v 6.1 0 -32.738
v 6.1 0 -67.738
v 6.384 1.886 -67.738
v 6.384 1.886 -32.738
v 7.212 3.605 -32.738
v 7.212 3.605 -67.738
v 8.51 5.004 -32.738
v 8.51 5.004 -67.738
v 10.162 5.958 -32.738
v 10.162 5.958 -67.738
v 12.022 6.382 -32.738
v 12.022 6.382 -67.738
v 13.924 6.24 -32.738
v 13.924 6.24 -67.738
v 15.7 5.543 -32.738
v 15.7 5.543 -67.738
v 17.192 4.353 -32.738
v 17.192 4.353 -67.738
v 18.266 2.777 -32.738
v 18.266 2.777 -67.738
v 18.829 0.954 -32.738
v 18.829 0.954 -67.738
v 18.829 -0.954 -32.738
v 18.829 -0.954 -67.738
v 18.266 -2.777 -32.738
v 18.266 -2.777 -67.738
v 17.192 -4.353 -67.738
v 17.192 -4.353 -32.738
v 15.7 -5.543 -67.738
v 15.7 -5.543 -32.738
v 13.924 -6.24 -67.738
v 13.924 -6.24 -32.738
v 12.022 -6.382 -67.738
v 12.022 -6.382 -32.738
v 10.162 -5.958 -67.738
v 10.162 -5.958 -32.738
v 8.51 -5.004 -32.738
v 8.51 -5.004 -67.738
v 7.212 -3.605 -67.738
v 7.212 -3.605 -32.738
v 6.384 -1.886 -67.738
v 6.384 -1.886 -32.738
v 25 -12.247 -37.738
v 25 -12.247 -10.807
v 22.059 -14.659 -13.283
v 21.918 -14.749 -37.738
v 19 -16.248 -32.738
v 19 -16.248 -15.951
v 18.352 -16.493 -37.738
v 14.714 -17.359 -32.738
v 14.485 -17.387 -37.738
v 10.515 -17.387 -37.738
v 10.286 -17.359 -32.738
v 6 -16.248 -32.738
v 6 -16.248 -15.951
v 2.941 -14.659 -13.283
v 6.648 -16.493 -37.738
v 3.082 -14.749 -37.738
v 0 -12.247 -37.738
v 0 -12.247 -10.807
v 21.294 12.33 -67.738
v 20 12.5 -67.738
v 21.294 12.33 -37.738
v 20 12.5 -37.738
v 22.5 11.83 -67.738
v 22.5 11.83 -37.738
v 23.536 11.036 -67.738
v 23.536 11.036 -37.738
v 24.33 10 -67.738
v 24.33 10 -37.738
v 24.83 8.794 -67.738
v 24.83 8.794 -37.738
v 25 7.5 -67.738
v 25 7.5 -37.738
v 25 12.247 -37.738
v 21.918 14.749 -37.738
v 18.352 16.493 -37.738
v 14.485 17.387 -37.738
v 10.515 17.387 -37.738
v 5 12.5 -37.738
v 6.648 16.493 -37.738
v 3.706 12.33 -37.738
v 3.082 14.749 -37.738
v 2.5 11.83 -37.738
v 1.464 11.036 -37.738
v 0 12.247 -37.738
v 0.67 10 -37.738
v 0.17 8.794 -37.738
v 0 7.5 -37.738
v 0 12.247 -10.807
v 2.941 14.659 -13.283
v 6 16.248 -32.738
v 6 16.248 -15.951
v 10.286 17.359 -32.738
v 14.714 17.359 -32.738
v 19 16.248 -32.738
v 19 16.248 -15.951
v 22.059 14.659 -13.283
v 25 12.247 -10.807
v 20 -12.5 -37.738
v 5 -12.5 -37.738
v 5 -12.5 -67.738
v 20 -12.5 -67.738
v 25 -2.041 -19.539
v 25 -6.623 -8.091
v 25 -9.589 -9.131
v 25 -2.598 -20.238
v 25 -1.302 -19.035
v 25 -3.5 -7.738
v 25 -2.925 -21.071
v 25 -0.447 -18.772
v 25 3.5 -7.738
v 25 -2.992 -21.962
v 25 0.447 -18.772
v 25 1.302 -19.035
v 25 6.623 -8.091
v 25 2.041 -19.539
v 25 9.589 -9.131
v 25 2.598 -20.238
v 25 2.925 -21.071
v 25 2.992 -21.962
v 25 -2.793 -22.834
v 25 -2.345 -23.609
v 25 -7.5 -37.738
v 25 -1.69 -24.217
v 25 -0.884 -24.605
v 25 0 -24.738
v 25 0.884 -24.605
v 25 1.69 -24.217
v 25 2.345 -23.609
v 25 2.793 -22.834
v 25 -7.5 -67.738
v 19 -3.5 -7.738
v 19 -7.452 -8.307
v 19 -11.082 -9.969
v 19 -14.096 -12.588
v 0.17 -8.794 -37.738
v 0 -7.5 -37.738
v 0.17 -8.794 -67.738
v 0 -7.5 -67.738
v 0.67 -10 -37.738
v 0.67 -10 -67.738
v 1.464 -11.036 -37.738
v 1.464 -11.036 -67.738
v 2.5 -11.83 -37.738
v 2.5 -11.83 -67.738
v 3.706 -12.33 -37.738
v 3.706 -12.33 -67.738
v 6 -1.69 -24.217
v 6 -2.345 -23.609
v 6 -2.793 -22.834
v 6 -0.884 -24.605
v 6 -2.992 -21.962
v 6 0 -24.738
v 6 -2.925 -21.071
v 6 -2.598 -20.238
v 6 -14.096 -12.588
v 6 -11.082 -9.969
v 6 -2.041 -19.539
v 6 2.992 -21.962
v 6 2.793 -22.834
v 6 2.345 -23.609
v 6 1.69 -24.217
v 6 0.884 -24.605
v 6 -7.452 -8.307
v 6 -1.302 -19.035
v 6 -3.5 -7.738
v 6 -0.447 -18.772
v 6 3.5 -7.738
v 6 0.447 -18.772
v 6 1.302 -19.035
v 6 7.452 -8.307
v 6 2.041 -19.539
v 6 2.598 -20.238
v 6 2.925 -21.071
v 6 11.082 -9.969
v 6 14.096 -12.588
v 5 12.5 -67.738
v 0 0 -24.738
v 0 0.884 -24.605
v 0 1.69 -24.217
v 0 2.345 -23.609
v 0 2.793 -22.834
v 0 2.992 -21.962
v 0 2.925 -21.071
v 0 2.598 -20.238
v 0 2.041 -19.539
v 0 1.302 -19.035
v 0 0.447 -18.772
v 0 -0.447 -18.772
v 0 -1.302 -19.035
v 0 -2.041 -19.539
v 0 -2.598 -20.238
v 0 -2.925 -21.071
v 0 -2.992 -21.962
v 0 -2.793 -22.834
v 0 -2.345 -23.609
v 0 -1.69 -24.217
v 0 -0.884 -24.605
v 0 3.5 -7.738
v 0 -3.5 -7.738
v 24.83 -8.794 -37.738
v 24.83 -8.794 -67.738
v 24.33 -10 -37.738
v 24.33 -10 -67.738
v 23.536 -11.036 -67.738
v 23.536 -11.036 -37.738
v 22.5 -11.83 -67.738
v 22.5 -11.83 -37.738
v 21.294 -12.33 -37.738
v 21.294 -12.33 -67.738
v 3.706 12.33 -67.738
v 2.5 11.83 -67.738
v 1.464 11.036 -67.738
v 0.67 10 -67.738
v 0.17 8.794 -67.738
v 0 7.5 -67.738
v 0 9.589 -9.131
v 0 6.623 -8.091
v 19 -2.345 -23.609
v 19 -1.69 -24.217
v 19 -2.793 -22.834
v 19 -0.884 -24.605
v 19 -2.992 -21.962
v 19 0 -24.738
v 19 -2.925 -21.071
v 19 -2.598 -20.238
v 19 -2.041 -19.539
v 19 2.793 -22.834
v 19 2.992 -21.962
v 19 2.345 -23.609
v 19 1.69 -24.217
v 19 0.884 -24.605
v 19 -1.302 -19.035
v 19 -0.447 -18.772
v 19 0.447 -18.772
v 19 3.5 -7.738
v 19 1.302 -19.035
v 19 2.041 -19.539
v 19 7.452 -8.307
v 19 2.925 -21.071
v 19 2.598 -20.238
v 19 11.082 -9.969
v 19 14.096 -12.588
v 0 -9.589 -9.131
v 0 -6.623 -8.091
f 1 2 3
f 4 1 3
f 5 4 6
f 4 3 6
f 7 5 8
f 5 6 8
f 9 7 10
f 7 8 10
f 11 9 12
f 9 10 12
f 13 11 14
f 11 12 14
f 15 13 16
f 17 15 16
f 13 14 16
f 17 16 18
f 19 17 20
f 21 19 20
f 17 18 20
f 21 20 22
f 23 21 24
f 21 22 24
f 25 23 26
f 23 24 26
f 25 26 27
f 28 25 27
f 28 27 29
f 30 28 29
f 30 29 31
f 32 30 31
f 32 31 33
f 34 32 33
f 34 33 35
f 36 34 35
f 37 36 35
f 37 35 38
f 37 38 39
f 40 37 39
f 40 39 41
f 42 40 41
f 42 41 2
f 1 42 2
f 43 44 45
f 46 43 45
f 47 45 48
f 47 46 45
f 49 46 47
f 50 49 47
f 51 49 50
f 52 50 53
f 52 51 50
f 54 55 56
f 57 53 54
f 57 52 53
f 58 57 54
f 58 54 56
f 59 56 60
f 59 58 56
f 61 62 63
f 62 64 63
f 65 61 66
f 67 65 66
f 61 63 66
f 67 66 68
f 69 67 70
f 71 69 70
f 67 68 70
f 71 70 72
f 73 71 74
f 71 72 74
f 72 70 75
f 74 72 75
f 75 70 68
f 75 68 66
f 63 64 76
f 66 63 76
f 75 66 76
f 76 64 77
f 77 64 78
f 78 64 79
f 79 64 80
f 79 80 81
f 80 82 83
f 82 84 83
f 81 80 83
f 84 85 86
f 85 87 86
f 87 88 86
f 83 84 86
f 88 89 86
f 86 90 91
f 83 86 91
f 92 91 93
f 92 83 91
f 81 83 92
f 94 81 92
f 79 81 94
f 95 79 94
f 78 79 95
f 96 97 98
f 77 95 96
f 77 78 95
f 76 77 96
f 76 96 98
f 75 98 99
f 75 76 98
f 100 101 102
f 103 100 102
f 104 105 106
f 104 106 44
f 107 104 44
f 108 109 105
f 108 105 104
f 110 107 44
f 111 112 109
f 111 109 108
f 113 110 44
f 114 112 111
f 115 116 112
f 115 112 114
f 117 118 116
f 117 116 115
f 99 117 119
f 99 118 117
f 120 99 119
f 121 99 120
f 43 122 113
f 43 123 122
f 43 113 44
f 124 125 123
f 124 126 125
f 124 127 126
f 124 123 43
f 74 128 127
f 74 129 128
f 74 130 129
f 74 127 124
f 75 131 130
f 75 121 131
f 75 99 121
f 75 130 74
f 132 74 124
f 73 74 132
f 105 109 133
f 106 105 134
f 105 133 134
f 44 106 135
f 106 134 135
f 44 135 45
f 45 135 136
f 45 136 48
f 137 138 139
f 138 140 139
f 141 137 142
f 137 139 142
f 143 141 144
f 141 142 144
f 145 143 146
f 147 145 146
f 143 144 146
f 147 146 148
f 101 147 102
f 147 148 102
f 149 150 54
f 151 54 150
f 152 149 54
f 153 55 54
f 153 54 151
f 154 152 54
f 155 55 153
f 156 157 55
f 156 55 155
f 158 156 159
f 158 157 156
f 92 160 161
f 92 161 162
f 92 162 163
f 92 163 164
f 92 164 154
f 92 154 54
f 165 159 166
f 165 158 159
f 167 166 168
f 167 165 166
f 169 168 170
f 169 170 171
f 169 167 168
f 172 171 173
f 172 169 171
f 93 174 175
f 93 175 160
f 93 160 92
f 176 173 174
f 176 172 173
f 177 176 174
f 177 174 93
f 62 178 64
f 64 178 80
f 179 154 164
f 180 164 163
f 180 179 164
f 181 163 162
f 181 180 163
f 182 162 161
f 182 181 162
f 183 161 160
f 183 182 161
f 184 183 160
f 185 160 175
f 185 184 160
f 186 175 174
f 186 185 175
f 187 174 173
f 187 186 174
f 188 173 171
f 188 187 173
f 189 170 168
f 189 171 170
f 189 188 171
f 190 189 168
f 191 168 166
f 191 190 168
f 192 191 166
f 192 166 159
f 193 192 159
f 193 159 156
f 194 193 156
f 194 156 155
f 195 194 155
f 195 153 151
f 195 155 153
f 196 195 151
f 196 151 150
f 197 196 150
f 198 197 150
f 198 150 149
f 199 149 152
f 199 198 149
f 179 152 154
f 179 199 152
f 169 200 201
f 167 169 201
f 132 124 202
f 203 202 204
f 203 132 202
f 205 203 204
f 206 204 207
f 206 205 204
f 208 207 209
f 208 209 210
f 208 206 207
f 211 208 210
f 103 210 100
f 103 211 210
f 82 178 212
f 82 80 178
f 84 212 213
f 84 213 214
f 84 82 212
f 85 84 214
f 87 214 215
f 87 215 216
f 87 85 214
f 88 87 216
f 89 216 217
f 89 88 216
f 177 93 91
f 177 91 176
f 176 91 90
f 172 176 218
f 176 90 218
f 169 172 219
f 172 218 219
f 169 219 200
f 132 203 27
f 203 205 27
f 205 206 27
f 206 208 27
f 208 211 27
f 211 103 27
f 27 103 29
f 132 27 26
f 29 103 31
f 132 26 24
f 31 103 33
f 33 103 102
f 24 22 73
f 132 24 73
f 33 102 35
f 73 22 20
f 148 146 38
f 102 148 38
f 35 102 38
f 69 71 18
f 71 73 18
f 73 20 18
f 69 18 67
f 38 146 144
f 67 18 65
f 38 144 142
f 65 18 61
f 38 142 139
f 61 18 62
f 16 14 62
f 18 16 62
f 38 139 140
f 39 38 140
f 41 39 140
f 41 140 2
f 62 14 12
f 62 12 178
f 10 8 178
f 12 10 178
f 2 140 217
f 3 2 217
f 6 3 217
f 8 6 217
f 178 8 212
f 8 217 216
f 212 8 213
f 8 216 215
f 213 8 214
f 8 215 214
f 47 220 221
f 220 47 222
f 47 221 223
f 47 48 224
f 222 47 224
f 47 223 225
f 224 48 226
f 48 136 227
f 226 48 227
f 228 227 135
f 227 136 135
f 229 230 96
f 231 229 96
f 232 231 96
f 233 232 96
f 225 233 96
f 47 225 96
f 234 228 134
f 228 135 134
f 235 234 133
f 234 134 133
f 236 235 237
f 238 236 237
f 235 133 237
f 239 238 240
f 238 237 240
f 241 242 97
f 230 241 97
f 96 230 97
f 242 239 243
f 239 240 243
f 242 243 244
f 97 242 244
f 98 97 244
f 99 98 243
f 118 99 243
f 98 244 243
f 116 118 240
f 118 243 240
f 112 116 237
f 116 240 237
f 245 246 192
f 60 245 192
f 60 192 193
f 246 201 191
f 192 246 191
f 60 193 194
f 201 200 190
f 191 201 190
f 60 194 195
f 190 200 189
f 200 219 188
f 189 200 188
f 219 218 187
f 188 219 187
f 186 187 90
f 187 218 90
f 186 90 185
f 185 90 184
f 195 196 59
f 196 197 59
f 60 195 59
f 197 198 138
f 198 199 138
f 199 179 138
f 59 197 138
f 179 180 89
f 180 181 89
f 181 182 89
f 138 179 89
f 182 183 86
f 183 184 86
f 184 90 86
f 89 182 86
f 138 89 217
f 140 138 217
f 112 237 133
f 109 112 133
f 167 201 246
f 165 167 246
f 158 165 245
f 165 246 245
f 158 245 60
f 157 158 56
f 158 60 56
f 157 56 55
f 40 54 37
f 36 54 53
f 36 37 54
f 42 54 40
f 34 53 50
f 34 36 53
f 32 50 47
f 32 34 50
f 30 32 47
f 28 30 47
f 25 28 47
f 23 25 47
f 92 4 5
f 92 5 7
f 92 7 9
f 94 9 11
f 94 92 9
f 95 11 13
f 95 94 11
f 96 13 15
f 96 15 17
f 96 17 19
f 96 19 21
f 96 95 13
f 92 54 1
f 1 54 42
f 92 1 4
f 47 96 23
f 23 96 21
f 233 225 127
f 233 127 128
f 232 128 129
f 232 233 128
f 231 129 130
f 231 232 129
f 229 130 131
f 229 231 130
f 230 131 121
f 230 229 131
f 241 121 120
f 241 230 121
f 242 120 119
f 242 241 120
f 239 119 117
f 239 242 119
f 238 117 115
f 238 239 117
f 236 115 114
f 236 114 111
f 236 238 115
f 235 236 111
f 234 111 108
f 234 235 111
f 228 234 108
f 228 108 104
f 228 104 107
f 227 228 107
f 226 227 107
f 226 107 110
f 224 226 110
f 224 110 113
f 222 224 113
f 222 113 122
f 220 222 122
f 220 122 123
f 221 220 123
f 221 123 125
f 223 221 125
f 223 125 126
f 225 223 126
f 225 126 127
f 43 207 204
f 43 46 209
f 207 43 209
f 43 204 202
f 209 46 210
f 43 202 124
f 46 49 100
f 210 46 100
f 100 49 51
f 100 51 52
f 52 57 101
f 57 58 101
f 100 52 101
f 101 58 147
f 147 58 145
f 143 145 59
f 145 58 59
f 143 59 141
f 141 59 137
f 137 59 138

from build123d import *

# Parameters (mm, degrees)
SKETCH1_R           = 3
BOSS_EXTRUDE1_DEPTH = 25
SKETCH3_R           = 6.4
CUT_EXTRUDE2_DEPTH  = 108
SKETCH4_W           = 13
SKETCH4_H           = 40.487648952
CUT_EXTRUDE3_DEPTH  = 25
FILLET2_R           = 5
SKETCH5_OUTSIDE_W   = 41.764
SKETCH5_OUTSIDE_H   = 51.764
SKETCH5_OUTSIDE_R   = 17.5
CUT_EXTRUDE5_DEPTH  = 39


with BuildPart() as part:
    # Sketch1 → Boss-Extrude1 (new body)
    with BuildSketch(Plane(origin=(0, 0, 0), x_dir=(0, 0, -1), z_dir=(1, 0, 0))):
        with BuildLine():
            Line((67.738148954, 12.5), (37.738148954, 12.5))
            Line((37.738148954, 12.5), (37.738148954, 17.5))
            Line((37.738148954, 17.5), (21.738148954, 17.5))
            ThreePointArc((21.738148954, 17.5), (11.838654018, 13.399494937), (7.738148954, 3.5))
            Line((7.738148954, 3.5), (7.738148954, -3.5))
            ThreePointArc((7.738148954, -3.5), (11.838654018, -13.399494937), (21.738148954, -17.5))
            Line((21.738148954, -17.5), (37.738148954, -17.5))
            Line((37.738148954, -17.5), (37.738148954, -12.5))
            Line((37.738148954, -12.5), (67.738148954, -12.5))
            Line((67.738148954, -12.5), (67.738148954, 12.5))
        make_face()
        with Locations((21.738148954, 0)):
            Circle(SKETCH1_R, mode=Mode.SUBTRACT)
    extrude(amount=BOSS_EXTRUDE1_DEPTH)

    # Sketch3 → Cut-Extrude2 (cut)
    with BuildSketch(Plane(origin=(0, 0, -67.738148954), x_dir=(-1, 0, 0), z_dir=(0, 0, -1))):
        with Locations((-12.5, 0)):
            Circle(SKETCH3_R)
    extrude(amount=-CUT_EXTRUDE2_DEPTH, mode=Mode.SUBTRACT)

    # Sketch4 → Cut-Extrude3 (cut)
    with BuildSketch(Plane.XY.offset(-7.738148954)):
        with Locations((12.5, 0)):
            Rectangle(SKETCH4_W, SKETCH4_H)
    extrude(amount=-CUT_EXTRUDE3_DEPTH, mode=Mode.SUBTRACT)

    # Fillet2
    fillet2_edges = [part.edges().sort_by_distance(p)[0] for p in [
        (0, 12.5, -52.738148954),
        (25, -12.5, -52.738148954),
        (25, 12.5, -52.738148954),
        (0, -12.5, -52.738148954),
    ]]
    fillet(fillet2_edges, radius=FILLET2_R)

    # Sketch5 outside → Cut-Extrude5 (cut)
    with BuildSketch(Plane(origin=(0, 0, -37.738148954), x_dir=(-1, 0, 0), z_dir=(0, 0, -1))):
        with Locations((-12.5, 0)):
            Rectangle(SKETCH5_OUTSIDE_W, SKETCH5_OUTSIDE_H)
        with Locations((-12.5, 0)):
            Circle(SKETCH5_OUTSIDE_R, mode=Mode.SUBTRACT)
    extrude(amount=-CUT_EXTRUDE5_DEPTH, mode=Mode.SUBTRACT)


solid = part.part
